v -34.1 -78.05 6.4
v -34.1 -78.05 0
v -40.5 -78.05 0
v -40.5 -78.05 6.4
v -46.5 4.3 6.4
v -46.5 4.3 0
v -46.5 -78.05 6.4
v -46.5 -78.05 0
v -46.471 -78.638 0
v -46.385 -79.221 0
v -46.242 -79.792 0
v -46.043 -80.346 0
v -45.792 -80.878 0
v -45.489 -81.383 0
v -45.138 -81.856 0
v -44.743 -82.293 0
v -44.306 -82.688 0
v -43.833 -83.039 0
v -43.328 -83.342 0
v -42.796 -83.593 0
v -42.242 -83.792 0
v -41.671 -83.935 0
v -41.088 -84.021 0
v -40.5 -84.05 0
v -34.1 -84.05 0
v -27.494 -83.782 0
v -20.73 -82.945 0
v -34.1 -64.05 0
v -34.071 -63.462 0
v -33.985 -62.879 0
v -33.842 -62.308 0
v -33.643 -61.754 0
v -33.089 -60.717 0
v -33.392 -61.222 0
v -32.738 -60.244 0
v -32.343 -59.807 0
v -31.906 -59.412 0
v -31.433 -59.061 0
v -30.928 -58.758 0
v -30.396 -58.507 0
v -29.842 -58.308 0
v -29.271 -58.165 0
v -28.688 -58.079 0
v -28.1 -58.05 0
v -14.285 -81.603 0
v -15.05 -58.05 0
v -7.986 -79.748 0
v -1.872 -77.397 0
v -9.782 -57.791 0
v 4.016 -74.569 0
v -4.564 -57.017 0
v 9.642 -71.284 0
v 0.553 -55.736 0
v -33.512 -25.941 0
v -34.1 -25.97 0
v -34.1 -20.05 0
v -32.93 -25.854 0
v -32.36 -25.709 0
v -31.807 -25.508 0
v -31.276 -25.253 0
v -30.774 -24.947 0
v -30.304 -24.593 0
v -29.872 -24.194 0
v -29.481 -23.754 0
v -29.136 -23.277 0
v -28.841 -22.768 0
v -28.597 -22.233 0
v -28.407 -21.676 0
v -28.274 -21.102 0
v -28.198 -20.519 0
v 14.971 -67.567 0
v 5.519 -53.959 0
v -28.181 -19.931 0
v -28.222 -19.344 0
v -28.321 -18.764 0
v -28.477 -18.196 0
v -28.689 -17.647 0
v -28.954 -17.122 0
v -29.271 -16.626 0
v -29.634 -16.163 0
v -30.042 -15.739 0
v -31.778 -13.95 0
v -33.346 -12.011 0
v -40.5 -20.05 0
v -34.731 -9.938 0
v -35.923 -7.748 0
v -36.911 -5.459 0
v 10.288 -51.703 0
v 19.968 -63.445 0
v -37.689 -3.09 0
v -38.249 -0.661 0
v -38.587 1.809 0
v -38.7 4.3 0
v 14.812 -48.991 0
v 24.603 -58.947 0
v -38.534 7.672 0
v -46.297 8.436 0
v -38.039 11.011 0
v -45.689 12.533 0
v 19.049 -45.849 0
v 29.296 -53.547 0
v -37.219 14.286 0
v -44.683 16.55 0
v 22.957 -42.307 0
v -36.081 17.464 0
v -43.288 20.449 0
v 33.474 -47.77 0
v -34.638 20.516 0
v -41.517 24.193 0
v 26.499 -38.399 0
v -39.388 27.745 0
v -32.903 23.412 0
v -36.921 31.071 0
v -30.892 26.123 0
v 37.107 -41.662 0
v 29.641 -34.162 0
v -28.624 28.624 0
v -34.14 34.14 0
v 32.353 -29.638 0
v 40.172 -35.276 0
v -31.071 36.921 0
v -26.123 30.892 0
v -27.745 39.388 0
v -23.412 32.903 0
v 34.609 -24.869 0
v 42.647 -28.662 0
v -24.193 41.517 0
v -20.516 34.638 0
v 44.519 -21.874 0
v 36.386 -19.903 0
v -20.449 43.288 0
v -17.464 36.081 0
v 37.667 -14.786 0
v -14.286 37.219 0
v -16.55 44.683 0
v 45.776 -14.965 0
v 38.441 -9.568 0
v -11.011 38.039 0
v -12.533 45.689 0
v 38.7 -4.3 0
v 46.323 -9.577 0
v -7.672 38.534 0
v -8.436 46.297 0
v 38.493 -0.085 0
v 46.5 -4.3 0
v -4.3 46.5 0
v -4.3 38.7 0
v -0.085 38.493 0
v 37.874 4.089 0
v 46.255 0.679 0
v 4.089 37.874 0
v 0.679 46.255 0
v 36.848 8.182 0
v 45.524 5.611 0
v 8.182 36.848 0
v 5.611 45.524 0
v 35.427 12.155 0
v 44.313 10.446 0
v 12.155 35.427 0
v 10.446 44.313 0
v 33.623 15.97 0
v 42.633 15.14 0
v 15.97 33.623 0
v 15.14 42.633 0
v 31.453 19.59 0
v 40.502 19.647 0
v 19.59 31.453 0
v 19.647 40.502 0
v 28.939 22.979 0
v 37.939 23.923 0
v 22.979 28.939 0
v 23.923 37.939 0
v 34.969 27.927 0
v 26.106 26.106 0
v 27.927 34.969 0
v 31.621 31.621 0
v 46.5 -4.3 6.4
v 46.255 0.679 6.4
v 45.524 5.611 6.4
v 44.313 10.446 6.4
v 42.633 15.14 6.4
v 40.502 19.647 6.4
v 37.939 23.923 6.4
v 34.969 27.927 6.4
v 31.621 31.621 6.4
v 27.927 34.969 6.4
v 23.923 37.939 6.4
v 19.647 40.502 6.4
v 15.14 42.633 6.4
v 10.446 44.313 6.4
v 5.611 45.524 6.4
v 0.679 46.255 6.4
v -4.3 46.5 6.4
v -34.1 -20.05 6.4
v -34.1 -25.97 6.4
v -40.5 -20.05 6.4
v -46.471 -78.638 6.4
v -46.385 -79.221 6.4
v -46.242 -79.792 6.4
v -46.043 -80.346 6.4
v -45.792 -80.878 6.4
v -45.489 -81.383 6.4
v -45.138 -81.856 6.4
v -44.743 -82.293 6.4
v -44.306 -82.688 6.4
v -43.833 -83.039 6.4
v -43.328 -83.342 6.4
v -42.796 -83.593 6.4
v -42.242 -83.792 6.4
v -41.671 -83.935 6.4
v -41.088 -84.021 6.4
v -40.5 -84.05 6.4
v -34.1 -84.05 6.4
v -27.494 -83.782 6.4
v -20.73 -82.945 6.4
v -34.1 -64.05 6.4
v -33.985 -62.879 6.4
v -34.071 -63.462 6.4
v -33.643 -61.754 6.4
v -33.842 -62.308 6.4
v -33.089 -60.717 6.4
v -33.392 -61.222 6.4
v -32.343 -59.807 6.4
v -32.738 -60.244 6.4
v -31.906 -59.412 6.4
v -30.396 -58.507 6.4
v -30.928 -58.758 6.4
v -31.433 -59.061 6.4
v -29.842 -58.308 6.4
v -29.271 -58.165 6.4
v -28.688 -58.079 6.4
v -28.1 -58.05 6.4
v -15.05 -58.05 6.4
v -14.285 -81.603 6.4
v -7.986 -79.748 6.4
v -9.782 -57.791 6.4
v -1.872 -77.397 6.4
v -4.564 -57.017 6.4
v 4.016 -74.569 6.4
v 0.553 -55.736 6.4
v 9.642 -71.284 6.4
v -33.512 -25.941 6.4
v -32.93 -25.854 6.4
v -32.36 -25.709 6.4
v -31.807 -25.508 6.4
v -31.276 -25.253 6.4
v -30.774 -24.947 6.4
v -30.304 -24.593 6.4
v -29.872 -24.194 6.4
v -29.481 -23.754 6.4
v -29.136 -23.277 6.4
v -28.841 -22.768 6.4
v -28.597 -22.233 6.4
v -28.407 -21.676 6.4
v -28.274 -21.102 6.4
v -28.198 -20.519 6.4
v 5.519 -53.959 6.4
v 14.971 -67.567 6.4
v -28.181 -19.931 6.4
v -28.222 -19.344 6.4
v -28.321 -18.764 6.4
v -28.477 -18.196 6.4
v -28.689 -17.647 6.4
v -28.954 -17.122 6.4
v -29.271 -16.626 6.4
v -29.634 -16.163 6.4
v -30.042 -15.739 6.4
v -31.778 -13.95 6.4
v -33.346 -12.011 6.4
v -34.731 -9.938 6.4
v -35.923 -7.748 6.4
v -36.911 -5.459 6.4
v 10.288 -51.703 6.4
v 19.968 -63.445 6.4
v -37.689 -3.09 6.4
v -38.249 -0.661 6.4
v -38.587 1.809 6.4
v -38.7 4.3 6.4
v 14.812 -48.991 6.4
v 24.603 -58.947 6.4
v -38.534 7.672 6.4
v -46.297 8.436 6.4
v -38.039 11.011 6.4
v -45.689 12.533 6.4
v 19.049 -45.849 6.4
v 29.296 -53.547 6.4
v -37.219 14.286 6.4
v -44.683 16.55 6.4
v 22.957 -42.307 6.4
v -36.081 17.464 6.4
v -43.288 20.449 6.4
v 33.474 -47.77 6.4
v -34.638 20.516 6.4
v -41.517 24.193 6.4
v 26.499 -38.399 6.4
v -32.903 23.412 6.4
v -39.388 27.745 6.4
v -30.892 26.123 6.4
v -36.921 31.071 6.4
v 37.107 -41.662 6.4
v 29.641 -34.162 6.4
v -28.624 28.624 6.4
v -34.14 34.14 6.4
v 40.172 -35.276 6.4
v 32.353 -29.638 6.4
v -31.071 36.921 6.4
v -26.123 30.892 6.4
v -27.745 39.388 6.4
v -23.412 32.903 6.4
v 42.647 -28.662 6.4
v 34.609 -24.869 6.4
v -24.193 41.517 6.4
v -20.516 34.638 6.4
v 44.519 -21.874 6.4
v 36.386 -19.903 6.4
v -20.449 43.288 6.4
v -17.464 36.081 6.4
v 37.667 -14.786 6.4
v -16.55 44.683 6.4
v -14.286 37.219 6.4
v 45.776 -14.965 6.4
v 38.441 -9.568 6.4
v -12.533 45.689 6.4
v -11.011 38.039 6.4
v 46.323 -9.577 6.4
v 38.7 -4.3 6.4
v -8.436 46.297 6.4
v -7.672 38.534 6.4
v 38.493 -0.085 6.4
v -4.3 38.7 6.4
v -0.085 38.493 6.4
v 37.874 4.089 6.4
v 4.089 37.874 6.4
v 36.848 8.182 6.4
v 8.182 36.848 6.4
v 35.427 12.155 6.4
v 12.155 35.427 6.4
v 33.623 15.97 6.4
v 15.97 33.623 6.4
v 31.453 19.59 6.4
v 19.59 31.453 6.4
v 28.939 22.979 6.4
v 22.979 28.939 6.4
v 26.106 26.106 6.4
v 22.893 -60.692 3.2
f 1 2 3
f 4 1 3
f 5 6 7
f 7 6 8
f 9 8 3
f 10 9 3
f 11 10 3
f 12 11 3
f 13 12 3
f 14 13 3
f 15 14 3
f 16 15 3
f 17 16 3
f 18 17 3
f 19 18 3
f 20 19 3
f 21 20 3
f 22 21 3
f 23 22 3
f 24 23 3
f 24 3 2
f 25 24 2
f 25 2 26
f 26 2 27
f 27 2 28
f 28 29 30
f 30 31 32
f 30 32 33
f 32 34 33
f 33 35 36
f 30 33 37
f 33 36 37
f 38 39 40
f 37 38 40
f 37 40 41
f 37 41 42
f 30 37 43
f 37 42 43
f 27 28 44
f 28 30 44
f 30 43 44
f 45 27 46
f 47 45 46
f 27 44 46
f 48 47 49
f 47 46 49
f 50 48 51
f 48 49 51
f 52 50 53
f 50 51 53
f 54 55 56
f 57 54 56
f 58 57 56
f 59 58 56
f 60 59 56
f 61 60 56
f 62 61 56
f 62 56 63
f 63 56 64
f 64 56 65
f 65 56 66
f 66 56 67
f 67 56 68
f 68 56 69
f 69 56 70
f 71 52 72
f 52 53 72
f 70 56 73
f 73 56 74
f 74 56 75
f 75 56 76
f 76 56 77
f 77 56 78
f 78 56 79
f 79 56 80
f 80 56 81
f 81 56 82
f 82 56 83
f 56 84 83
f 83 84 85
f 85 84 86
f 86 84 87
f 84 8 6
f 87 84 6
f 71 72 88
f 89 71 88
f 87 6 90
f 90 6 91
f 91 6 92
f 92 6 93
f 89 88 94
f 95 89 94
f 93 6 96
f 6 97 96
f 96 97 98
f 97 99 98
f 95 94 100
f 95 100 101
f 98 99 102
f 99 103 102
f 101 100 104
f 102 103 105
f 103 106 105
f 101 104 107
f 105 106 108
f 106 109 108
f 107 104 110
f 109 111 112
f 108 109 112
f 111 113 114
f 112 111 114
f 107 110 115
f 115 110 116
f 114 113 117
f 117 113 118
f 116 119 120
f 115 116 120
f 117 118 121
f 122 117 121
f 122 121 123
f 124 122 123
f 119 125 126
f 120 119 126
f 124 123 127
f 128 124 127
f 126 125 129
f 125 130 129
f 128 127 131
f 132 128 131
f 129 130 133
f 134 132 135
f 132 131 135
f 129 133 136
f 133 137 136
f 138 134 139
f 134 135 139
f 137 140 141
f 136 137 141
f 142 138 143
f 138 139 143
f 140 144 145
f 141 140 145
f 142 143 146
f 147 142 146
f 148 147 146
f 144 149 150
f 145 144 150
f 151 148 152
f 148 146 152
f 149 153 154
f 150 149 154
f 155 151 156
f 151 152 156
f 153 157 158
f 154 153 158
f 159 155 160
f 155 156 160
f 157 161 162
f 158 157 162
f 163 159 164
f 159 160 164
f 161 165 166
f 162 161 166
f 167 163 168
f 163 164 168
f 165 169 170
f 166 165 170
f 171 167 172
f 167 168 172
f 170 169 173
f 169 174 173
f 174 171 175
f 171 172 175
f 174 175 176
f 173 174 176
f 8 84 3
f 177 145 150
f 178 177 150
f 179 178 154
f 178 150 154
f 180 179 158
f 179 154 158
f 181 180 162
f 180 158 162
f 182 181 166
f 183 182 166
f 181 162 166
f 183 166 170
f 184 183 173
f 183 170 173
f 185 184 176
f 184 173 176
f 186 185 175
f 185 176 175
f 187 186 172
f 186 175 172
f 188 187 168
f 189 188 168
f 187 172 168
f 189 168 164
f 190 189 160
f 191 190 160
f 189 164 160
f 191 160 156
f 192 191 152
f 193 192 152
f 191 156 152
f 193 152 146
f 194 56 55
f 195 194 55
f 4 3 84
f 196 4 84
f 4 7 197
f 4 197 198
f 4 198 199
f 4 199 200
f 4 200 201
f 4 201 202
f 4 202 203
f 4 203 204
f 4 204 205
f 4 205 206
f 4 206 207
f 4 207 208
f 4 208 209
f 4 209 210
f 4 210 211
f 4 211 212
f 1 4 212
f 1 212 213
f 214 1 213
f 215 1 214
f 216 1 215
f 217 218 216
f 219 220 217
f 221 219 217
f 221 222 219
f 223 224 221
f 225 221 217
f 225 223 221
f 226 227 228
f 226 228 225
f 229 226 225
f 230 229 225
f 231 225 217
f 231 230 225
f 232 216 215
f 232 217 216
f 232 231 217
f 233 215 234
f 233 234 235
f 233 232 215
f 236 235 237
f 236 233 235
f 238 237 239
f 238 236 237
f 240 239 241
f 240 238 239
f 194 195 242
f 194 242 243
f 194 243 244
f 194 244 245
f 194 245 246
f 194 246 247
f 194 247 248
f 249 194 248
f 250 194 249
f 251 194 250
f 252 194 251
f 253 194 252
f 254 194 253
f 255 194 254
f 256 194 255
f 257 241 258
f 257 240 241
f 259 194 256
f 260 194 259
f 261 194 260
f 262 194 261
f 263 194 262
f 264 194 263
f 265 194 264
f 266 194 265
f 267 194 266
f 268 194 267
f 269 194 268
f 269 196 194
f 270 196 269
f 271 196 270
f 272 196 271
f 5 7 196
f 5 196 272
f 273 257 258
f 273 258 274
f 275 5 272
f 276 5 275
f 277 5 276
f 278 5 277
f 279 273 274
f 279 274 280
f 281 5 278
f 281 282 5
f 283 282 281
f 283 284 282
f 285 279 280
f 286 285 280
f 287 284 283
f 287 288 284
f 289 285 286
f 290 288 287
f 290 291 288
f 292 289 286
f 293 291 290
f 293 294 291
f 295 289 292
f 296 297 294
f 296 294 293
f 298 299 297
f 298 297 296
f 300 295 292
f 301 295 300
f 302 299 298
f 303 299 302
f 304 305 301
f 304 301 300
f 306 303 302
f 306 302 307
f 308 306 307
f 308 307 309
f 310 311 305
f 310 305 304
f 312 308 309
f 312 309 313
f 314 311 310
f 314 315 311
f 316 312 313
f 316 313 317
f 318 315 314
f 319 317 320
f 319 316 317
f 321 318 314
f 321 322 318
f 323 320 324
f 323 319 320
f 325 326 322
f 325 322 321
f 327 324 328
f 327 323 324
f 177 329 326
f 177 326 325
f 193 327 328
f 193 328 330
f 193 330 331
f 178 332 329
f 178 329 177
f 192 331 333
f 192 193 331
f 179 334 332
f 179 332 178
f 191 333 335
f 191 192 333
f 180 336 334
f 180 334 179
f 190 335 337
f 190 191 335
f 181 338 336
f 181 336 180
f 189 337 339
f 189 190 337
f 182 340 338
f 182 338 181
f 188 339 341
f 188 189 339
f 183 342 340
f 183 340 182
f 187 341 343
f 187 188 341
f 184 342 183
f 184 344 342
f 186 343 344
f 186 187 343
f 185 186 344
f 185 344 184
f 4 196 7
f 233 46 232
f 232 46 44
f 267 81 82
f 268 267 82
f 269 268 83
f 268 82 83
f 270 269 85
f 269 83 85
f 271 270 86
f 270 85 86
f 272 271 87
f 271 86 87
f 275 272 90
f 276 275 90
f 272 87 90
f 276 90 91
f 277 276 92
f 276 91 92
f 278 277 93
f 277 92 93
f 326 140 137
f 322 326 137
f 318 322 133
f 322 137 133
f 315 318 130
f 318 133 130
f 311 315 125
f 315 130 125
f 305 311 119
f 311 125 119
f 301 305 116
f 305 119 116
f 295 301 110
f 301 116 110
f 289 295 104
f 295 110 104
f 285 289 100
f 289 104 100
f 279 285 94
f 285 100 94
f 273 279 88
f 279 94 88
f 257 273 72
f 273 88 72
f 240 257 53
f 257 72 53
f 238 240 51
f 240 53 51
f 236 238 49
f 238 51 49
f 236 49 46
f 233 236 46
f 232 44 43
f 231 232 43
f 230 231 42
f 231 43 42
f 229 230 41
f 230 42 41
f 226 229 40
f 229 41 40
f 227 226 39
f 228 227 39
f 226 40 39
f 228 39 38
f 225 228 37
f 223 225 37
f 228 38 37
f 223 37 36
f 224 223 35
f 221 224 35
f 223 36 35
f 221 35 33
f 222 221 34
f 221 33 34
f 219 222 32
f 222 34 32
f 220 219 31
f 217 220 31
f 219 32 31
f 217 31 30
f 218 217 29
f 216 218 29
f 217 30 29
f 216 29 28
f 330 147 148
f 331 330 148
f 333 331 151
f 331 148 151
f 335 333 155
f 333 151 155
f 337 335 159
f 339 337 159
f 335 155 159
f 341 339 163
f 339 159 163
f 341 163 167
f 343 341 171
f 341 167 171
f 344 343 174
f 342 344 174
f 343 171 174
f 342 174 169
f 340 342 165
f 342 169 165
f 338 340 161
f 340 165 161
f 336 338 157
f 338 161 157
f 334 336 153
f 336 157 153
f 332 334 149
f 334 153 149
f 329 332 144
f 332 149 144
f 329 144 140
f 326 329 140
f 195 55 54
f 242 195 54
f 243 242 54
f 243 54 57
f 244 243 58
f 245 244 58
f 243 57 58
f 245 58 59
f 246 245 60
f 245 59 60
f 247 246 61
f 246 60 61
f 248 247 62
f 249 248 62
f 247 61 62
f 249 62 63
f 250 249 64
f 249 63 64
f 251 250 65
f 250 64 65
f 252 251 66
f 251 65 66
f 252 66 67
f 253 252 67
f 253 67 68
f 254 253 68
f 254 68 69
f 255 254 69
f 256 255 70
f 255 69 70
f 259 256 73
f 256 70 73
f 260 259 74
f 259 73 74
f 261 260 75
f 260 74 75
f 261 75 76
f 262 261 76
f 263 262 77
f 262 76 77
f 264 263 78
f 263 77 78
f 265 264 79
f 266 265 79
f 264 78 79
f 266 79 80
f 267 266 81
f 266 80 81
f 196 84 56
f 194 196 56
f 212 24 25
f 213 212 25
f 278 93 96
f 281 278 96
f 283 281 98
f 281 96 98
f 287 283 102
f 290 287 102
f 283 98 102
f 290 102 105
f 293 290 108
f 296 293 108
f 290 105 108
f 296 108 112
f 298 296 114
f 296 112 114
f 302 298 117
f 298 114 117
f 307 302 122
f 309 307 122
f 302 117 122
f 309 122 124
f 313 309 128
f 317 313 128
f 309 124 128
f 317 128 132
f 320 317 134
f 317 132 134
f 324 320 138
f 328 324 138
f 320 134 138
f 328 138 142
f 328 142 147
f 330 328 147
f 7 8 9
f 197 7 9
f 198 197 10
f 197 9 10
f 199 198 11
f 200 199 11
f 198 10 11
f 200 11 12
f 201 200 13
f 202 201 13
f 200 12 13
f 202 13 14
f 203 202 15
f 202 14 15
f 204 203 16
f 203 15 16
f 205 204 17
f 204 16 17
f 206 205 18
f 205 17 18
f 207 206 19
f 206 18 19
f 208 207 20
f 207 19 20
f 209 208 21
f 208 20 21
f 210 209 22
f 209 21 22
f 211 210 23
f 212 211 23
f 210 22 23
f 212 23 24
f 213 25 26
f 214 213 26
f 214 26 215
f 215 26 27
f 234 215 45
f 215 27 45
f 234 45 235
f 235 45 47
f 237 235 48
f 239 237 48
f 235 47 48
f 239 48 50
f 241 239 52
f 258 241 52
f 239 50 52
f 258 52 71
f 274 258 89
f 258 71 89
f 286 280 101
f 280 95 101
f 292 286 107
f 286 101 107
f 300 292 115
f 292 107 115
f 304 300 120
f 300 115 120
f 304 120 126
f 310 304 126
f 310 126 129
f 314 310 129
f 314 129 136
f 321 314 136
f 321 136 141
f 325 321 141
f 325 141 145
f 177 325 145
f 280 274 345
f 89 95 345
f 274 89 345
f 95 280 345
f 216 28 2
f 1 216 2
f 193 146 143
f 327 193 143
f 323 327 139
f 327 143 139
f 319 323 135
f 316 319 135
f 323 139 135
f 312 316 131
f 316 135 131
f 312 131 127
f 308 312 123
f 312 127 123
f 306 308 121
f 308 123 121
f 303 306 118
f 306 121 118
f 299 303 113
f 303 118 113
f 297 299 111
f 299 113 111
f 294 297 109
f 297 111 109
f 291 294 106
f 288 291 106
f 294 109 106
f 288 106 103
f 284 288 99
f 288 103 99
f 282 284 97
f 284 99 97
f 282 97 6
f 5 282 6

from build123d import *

# Parameters (mm, degrees)
F2_DEPTH = 6.4


with BuildPart() as f2:
    # F1 (on Top) → F2 (new body)
    with BuildSketch(Plane.XY):
        with BuildLine():
            Line((-46.5, 4.3), (-46.5, -78.05))
            ThreePointArc((-46.5, -78.05), (-44.7426406871, -82.2926406871), (-40.5, -84.05))
            Line((-40.5, -84.05), (-34.1, -84.05))
            add(Edge.make_bspline(
                [(-34.1, -84.05), (46.5, -84.05), (46.5, -4.3)],
                knots=[4.7123889804, 4.7123889804, 4.7123889804, 6.2831853072, 6.2831853072, 6.2831853072], degree=2, weights=[1, 0.7071067812, 1]))
            ThreePointArc((46.5, -4.3), (31.6210244843, 31.6210244843), (-4.3, 46.5))
            ThreePointArc((-4.3, 46.5), (-34.1399061661, 34.1399061661), (-46.5, 4.3))
        make_face()
        with BuildLine():
            Line((-34.1, -78.05), (-40.5, -78.05))
            Line((-40.5, -78.05), (-40.5, -20.05))
            Line((-40.5, -20.05), (-34.1, -20.05))
            Line((-34.1, -20.05), (-34.1, -25.9702287672))
            ThreePointArc((-34.1, -25.9702287672), (-28.5967900968, -22.2326106882), (-30.0422633054, -15.7390973598))
            ThreePointArc((-30.0422633054, -15.7390973598), (-36.4430153205, -6.6146899597), (-38.7, 4.3))
            ThreePointArc((-38.7, 4.3), (-28.6244732728, 28.6244732728), (-4.3, 38.7))
            ThreePointArc((-4.3, 38.7), (26.105591591, 26.105591591), (38.7, -4.3))
            ThreePointArc((38.7, -4.3), (22.9569894888, -42.3069894888), (-15.05, -58.05))
            Line((-15.05, -58.05), (-28.1, -58.05))
            ThreePointArc((-28.1, -58.05), (-32.3426406871, -59.8073593129), (-34.1, -64.05))
            Line((-34.1, -64.05), (-34.1, -78.05))
        make_face(mode=Mode.SUBTRACT)
    extrude(amount=F2_DEPTH)


solid = f2.part
